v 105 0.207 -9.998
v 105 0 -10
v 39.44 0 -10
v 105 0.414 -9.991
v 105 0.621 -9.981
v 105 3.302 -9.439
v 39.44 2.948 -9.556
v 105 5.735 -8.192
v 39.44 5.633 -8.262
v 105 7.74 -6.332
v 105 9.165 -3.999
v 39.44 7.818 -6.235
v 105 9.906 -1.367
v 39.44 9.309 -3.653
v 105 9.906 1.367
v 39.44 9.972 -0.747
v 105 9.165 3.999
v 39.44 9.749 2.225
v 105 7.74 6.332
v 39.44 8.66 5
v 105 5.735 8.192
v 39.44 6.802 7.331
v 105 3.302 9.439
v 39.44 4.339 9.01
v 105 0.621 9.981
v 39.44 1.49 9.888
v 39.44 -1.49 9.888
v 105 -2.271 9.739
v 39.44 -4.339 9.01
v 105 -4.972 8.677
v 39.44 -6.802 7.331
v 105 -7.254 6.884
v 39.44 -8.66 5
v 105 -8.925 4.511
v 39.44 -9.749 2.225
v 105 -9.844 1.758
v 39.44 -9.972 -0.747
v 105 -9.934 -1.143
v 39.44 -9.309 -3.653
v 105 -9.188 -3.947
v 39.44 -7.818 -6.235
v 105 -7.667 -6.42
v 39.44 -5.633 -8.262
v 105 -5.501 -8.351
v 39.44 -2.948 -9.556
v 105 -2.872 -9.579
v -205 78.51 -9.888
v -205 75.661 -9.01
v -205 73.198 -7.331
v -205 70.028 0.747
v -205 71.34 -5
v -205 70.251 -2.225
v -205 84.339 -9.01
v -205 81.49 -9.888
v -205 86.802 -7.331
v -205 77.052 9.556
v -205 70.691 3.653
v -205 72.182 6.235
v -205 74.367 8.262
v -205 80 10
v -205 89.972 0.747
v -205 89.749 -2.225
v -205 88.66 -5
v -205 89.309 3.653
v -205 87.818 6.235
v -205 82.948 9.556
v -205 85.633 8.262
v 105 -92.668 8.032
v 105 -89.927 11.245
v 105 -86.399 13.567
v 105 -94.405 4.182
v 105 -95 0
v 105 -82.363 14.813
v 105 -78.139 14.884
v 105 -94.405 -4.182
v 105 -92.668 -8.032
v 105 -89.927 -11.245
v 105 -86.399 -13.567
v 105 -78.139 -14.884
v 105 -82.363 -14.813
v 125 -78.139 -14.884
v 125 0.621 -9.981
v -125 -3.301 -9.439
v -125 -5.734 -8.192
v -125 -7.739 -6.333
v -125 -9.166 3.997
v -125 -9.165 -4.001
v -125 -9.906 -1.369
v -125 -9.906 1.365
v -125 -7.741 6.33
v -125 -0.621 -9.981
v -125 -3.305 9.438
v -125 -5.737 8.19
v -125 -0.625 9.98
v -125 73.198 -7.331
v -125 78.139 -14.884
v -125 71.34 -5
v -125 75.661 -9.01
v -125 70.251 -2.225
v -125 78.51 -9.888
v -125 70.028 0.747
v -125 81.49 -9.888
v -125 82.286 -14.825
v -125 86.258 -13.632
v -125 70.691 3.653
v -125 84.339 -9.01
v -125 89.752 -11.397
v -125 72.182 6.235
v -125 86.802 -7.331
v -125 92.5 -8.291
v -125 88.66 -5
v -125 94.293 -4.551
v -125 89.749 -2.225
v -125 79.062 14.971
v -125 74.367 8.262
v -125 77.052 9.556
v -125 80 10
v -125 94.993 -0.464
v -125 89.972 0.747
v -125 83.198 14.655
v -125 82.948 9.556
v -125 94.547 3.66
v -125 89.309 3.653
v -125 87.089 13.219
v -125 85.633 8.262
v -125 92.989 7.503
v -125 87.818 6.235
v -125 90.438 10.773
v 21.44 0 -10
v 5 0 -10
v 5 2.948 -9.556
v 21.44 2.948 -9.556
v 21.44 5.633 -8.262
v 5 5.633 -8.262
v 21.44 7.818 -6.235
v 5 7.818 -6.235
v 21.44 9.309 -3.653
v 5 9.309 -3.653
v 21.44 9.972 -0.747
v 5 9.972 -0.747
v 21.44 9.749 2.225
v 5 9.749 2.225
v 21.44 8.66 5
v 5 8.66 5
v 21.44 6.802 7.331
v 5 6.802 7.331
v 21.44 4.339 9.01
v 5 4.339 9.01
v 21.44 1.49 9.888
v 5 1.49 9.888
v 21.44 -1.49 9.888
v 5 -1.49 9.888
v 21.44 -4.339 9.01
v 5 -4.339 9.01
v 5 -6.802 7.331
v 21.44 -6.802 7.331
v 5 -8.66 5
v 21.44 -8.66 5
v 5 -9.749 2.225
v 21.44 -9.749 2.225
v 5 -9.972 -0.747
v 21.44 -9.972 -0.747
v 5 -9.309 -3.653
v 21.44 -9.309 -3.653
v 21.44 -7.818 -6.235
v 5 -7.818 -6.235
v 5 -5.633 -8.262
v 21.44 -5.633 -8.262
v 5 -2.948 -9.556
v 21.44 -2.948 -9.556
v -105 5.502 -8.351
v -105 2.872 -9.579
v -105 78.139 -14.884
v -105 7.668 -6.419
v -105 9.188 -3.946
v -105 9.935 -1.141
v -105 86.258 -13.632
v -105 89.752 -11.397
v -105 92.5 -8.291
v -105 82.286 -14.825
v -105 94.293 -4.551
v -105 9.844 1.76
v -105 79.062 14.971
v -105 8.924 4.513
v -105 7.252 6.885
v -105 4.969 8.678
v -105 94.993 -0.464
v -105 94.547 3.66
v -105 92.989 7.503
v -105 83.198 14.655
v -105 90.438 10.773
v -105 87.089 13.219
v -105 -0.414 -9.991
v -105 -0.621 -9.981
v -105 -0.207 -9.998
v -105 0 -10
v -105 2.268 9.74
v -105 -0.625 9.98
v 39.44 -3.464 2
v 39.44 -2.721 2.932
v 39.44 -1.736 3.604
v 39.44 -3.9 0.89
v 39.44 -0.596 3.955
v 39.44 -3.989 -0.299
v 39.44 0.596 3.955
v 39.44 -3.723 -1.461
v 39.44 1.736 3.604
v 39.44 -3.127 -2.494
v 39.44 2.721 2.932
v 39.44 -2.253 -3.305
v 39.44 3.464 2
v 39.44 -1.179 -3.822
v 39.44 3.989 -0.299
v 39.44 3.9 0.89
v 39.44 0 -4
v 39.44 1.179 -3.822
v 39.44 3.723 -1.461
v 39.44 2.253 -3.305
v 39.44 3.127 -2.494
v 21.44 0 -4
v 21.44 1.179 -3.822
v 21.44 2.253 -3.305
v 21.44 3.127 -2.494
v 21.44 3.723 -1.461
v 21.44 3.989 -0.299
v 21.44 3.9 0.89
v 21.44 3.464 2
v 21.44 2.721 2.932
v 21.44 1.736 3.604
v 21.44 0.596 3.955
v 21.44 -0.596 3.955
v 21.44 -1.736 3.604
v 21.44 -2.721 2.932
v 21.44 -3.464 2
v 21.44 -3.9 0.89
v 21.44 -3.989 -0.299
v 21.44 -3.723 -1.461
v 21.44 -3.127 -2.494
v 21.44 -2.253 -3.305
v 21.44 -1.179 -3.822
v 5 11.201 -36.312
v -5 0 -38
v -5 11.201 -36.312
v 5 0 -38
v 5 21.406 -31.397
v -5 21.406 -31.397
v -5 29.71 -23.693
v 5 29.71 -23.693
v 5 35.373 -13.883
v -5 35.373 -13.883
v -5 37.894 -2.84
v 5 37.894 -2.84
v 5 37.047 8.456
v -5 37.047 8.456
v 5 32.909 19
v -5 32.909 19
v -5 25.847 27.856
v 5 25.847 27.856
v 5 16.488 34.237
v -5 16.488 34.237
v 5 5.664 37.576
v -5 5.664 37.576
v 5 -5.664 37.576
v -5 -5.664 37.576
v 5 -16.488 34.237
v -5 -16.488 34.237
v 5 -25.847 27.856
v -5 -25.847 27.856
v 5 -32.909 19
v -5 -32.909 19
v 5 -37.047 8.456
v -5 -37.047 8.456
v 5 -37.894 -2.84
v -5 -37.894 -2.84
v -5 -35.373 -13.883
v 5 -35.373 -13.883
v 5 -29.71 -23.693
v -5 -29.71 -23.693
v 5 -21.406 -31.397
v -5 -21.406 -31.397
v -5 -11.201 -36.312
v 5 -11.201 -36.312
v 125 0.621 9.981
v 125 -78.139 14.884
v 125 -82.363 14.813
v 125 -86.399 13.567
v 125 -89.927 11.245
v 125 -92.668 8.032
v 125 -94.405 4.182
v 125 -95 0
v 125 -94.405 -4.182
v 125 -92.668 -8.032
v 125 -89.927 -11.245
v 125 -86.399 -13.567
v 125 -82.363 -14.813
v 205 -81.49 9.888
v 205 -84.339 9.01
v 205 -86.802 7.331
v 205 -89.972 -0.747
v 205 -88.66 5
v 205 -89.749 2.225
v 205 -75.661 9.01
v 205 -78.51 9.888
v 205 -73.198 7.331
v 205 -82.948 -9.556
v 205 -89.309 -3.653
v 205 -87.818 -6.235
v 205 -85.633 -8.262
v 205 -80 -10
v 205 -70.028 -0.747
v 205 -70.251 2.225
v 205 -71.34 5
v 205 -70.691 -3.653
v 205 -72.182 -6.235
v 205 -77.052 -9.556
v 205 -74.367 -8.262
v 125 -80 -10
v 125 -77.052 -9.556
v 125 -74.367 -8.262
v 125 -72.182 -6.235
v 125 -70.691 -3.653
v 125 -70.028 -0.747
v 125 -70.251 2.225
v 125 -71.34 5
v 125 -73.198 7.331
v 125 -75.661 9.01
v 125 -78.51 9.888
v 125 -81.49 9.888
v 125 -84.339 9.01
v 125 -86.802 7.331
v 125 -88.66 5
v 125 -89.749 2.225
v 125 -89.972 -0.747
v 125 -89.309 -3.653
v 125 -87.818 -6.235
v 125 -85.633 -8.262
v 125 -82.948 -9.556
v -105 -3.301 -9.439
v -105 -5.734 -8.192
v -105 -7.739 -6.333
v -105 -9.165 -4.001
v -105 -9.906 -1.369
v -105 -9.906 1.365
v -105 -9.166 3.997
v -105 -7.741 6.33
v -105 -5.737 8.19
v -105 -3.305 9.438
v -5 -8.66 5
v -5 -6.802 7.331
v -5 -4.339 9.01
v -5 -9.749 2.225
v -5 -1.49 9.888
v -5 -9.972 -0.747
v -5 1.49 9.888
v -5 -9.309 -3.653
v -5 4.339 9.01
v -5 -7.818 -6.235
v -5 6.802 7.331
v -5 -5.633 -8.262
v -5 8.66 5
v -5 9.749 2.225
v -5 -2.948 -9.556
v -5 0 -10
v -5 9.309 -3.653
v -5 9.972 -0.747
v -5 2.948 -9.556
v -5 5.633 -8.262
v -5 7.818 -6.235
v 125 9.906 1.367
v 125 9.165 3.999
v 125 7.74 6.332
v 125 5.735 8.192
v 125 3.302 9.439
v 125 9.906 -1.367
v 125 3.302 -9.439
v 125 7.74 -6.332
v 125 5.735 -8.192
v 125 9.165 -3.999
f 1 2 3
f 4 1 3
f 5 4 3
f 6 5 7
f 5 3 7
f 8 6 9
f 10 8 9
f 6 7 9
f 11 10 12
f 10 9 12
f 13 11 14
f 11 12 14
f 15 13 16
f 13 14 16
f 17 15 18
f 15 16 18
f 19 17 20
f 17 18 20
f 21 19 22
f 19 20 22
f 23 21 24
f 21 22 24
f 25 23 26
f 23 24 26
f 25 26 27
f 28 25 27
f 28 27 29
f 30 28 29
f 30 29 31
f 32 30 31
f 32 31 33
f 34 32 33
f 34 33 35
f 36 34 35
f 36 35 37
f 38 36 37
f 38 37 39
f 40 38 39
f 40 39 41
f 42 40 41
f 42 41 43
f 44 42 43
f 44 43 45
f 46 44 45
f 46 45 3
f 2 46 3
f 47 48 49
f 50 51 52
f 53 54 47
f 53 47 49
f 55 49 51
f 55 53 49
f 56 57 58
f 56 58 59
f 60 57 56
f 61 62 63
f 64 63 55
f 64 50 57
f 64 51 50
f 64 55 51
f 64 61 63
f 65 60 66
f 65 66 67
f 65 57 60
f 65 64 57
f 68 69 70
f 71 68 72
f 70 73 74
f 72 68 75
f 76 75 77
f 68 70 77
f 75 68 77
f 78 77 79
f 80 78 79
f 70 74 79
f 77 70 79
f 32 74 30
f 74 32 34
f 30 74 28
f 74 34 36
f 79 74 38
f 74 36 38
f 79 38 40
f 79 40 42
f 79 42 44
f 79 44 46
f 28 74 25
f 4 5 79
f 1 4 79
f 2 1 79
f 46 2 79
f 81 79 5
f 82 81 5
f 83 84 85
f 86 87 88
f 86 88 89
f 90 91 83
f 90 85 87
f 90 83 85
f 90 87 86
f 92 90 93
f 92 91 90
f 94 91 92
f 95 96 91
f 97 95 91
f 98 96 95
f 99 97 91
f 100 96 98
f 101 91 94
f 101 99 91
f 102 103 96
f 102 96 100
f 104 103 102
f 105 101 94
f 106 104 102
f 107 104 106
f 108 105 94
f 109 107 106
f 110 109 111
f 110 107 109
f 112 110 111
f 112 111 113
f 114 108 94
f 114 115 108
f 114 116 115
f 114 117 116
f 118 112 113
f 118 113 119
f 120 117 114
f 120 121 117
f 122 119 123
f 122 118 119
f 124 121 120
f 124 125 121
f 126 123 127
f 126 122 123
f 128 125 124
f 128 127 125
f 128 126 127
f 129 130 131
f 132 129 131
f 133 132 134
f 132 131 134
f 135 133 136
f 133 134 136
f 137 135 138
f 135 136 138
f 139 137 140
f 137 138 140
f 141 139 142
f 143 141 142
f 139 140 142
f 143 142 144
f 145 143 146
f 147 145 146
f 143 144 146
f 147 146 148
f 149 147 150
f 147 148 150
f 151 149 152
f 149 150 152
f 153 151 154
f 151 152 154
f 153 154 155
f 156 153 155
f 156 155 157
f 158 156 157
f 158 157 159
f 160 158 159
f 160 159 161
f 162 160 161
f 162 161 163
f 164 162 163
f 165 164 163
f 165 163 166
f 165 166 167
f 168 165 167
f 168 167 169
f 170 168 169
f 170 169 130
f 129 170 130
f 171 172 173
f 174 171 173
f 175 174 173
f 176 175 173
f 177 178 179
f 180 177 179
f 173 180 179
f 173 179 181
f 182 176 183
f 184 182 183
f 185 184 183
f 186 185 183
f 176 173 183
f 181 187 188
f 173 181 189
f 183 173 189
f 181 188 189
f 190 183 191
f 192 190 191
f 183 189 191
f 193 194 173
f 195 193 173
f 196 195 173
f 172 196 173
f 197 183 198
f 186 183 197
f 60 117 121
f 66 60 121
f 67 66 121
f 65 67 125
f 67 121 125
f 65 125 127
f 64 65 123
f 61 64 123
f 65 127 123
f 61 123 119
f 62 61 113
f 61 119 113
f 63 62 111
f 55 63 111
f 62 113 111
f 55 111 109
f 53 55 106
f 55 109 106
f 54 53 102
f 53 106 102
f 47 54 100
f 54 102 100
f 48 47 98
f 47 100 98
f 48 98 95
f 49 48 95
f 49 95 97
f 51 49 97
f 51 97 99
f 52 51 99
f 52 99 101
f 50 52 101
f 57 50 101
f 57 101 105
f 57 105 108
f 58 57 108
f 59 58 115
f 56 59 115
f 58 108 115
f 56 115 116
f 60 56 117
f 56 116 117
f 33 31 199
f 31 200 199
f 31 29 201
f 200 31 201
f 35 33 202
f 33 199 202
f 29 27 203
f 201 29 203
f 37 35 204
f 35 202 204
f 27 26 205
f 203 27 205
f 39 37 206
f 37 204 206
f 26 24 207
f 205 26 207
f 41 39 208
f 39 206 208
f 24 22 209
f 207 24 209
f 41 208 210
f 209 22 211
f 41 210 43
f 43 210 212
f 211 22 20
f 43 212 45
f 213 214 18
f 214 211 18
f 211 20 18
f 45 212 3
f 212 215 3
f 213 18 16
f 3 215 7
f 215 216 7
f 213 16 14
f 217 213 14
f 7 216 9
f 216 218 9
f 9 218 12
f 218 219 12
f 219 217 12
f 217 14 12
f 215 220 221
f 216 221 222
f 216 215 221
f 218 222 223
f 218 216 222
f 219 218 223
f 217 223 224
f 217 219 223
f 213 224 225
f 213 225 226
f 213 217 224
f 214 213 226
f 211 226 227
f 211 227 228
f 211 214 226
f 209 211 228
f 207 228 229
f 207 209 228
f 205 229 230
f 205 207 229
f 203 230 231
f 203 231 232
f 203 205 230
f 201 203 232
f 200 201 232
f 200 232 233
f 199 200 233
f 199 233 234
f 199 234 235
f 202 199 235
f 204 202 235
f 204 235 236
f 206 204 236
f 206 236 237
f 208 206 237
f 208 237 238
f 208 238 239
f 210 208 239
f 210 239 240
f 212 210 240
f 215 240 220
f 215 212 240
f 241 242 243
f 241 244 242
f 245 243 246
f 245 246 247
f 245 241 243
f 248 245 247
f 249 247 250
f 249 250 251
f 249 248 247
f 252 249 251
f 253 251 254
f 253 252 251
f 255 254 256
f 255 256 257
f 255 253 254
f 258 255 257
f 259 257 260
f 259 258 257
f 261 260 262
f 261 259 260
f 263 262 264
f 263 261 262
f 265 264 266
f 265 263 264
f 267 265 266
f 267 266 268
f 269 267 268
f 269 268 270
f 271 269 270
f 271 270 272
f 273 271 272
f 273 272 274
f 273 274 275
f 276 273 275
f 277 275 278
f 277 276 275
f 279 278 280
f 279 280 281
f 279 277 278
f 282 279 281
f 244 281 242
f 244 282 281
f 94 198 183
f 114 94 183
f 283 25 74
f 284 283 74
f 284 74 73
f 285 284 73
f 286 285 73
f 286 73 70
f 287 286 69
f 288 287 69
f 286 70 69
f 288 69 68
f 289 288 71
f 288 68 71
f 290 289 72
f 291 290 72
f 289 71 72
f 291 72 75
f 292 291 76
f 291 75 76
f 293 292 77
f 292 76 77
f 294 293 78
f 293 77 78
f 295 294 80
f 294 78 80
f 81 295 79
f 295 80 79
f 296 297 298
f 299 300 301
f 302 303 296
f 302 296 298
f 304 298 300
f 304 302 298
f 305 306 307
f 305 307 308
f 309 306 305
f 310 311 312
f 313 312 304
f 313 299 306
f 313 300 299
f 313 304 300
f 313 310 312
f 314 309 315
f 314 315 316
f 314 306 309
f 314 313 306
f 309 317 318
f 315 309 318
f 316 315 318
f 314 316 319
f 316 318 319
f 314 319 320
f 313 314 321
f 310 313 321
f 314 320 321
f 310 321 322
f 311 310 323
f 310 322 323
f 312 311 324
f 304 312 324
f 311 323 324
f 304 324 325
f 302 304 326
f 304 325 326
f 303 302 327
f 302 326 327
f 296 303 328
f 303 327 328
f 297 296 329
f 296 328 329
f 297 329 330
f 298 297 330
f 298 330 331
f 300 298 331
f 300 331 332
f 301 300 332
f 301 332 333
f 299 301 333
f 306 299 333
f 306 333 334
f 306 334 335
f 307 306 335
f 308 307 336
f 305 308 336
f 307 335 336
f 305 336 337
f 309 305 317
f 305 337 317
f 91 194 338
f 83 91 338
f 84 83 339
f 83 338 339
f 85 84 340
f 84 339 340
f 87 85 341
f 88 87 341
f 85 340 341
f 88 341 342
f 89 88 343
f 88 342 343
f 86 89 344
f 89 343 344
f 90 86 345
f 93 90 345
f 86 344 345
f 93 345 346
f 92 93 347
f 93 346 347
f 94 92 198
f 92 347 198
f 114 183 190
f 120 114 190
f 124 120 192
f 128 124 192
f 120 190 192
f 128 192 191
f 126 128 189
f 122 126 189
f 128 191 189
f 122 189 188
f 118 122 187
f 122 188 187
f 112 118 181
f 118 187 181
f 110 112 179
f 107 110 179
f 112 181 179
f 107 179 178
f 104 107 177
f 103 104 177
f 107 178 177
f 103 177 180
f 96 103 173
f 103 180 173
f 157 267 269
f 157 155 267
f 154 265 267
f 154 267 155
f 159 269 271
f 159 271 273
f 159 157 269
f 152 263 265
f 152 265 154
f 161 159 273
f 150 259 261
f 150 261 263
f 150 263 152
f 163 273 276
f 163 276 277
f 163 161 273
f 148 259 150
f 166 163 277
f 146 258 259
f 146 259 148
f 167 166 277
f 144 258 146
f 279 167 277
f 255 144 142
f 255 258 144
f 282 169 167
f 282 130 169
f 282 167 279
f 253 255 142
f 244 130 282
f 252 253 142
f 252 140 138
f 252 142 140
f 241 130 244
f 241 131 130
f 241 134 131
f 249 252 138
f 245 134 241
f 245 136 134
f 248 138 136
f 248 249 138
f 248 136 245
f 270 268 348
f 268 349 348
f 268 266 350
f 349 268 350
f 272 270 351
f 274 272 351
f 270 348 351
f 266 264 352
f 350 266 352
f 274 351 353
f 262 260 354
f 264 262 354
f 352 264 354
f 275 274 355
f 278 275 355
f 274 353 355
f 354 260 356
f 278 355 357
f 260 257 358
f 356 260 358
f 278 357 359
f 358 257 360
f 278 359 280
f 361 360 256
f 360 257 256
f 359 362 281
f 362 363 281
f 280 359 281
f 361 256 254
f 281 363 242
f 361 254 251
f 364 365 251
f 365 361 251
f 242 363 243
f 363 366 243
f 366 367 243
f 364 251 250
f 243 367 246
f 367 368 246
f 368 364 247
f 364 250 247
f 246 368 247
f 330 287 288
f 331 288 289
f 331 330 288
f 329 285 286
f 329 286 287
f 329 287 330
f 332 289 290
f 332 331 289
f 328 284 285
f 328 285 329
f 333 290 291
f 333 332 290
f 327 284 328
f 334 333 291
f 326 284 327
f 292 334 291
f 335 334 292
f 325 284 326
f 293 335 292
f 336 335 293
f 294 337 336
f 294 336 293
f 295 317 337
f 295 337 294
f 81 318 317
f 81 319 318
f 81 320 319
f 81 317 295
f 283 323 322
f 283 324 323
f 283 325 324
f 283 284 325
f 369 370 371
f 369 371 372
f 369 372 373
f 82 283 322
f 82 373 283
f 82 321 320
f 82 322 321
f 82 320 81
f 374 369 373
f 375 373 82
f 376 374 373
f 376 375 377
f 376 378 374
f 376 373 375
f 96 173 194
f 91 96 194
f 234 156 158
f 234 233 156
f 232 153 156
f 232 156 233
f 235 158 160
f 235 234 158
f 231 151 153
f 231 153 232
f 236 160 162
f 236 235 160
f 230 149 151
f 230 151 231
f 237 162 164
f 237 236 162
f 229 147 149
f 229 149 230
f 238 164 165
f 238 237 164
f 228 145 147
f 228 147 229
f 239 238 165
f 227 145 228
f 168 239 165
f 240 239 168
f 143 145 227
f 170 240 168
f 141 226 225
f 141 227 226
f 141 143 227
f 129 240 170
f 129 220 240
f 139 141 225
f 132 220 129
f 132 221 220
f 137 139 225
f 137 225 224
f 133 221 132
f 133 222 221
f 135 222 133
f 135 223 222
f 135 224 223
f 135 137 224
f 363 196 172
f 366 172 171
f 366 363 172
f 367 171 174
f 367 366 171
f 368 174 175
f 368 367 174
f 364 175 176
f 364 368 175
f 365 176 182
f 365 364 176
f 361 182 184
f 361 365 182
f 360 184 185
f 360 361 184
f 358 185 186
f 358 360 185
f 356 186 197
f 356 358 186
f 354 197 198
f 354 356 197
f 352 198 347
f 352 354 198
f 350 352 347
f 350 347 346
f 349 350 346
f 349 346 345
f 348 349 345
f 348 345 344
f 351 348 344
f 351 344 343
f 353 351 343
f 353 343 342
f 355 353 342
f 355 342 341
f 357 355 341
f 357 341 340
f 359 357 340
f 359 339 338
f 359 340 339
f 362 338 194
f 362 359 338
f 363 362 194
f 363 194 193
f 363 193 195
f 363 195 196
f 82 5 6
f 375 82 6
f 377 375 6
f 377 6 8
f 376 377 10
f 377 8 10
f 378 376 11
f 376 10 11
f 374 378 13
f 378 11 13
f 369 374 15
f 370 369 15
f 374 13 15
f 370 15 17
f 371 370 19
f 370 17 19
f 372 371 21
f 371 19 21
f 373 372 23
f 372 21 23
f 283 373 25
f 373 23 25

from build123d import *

# Parameters (mm, degrees)
CROQUIS1_R              = 38
SALIENTE_EXTRUIR2_DEPTH = 5
CROQUIS2_R              = 10
SALIENTE_EXTRUIR3_DEPTH = 100
SALIENTE_EXTRUIR4_DEPTH = 20
CROQUIS4_R              = 10
SALIENTE_EXTRUIR5_DEPTH = 80
SALIENTE_EXTRUIR6_DEPTH = 20
CROQUIS6_R              = 10
SALIENTE_EXTRUIR7_DEPTH = 80
CROQUIS7_R              = 10
CROQUIS7_R_2            = 4
CORTAR_EXTRUIR1_DEPTH   = 18


with BuildPart() as part:
    # Croquis1 → Saliente-Extruir2 (new, symmetric)
    with BuildSketch(Plane(origin=(0, 0, 0), x_dir=(0, 0, -1), z_dir=(1, 0, 0))):
        Circle(CROQUIS1_R)
    extrude(amount=SALIENTE_EXTRUIR2_DEPTH, both=True)

    # Croquis2 → Saliente-Extruir3 (add)
    with BuildSketch(Plane(origin=(5, 0, 0), x_dir=(0, 0, -1), z_dir=(1, 0, 0))):
        Circle(CROQUIS2_R)
    saliente_extruir3 = extrude(amount=SALIENTE_EXTRUIR3_DEPTH)

    # Croquis3 → Saliente-Extruir4 (add)
    with BuildSketch(Plane(origin=(105, 0, 0), x_dir=(0, 0, -1), z_dir=(1, 0, 0))):
        with BuildLine():
            Line((-9.980675877, 0.621376727), (-14.884167289, -78.139472087))
            ThreePointArc((-14.884167289, -78.139472087), (0, -95), (14.884167289, -78.139472087))
            Line((14.884167289, -78.139472087), (9.980675877, 0.621376727))
            ThreePointArc((9.980675877, 0.621376727), (0, 10), (-9.980675877, 0.621376727))
        make_face()
    extrude(amount=SALIENTE_EXTRUIR4_DEPTH)

    # Croquis4 → Saliente-Extruir5 (add)
    with BuildSketch(Plane(origin=(125, 0, 0), x_dir=(0, 0, -1), z_dir=(1, 0, 0))):
        with Locations((0, -80)):
            Circle(CROQUIS4_R)
    extrude(amount=SALIENTE_EXTRUIR5_DEPTH)

    # Simetría1: Saliente-Extruir3 across plane
    add(saliente_extruir3.mirror(Plane(origin=(0, 0, 0), x_dir=(0, 0, 1), z_dir=(1, 0, 0))))

    # Croquis5 → Saliente-Extruir6 (add)
    with BuildSketch(Plane.ZY.offset(105)):
        with BuildLine():
            Line((-14.884167289, 78.139472087), (-9.980675877, -0.621376727))
            ThreePointArc((-9.980675877, -0.621376727), (-0.001815165, -9.999999835), (9.980449639, -0.625))
            Line((9.980449639, -0.625), (14.970674459, 79.0625))
            ThreePointArc((14.970674459, 79.0625), (-0.463536411, 94.992836089), (-14.884167289, 78.139472087))
        make_face()
    extrude(amount=SALIENTE_EXTRUIR6_DEPTH)

    # Croquis6 → Saliente-Extruir7 (add)
    with BuildSketch(Plane.ZY.offset(125)):
        with Locations((0, 80)):
            Circle(CROQUIS6_R)
    extrude(amount=SALIENTE_EXTRUIR7_DEPTH)

    # Croquis7 → Cortar-Extruir1 (cut)
    with BuildSketch(Plane(origin=(39.44, 0, 0), x_dir=(0, 0, -1), z_dir=(1, 0, 0))):
        Circle(CROQUIS7_R)
        Circle(CROQUIS7_R_2, mode=Mode.SUBTRACT)
    extrude(amount=-CORTAR_EXTRUIR1_DEPTH, mode=Mode.SUBTRACT)


solid = part.part
